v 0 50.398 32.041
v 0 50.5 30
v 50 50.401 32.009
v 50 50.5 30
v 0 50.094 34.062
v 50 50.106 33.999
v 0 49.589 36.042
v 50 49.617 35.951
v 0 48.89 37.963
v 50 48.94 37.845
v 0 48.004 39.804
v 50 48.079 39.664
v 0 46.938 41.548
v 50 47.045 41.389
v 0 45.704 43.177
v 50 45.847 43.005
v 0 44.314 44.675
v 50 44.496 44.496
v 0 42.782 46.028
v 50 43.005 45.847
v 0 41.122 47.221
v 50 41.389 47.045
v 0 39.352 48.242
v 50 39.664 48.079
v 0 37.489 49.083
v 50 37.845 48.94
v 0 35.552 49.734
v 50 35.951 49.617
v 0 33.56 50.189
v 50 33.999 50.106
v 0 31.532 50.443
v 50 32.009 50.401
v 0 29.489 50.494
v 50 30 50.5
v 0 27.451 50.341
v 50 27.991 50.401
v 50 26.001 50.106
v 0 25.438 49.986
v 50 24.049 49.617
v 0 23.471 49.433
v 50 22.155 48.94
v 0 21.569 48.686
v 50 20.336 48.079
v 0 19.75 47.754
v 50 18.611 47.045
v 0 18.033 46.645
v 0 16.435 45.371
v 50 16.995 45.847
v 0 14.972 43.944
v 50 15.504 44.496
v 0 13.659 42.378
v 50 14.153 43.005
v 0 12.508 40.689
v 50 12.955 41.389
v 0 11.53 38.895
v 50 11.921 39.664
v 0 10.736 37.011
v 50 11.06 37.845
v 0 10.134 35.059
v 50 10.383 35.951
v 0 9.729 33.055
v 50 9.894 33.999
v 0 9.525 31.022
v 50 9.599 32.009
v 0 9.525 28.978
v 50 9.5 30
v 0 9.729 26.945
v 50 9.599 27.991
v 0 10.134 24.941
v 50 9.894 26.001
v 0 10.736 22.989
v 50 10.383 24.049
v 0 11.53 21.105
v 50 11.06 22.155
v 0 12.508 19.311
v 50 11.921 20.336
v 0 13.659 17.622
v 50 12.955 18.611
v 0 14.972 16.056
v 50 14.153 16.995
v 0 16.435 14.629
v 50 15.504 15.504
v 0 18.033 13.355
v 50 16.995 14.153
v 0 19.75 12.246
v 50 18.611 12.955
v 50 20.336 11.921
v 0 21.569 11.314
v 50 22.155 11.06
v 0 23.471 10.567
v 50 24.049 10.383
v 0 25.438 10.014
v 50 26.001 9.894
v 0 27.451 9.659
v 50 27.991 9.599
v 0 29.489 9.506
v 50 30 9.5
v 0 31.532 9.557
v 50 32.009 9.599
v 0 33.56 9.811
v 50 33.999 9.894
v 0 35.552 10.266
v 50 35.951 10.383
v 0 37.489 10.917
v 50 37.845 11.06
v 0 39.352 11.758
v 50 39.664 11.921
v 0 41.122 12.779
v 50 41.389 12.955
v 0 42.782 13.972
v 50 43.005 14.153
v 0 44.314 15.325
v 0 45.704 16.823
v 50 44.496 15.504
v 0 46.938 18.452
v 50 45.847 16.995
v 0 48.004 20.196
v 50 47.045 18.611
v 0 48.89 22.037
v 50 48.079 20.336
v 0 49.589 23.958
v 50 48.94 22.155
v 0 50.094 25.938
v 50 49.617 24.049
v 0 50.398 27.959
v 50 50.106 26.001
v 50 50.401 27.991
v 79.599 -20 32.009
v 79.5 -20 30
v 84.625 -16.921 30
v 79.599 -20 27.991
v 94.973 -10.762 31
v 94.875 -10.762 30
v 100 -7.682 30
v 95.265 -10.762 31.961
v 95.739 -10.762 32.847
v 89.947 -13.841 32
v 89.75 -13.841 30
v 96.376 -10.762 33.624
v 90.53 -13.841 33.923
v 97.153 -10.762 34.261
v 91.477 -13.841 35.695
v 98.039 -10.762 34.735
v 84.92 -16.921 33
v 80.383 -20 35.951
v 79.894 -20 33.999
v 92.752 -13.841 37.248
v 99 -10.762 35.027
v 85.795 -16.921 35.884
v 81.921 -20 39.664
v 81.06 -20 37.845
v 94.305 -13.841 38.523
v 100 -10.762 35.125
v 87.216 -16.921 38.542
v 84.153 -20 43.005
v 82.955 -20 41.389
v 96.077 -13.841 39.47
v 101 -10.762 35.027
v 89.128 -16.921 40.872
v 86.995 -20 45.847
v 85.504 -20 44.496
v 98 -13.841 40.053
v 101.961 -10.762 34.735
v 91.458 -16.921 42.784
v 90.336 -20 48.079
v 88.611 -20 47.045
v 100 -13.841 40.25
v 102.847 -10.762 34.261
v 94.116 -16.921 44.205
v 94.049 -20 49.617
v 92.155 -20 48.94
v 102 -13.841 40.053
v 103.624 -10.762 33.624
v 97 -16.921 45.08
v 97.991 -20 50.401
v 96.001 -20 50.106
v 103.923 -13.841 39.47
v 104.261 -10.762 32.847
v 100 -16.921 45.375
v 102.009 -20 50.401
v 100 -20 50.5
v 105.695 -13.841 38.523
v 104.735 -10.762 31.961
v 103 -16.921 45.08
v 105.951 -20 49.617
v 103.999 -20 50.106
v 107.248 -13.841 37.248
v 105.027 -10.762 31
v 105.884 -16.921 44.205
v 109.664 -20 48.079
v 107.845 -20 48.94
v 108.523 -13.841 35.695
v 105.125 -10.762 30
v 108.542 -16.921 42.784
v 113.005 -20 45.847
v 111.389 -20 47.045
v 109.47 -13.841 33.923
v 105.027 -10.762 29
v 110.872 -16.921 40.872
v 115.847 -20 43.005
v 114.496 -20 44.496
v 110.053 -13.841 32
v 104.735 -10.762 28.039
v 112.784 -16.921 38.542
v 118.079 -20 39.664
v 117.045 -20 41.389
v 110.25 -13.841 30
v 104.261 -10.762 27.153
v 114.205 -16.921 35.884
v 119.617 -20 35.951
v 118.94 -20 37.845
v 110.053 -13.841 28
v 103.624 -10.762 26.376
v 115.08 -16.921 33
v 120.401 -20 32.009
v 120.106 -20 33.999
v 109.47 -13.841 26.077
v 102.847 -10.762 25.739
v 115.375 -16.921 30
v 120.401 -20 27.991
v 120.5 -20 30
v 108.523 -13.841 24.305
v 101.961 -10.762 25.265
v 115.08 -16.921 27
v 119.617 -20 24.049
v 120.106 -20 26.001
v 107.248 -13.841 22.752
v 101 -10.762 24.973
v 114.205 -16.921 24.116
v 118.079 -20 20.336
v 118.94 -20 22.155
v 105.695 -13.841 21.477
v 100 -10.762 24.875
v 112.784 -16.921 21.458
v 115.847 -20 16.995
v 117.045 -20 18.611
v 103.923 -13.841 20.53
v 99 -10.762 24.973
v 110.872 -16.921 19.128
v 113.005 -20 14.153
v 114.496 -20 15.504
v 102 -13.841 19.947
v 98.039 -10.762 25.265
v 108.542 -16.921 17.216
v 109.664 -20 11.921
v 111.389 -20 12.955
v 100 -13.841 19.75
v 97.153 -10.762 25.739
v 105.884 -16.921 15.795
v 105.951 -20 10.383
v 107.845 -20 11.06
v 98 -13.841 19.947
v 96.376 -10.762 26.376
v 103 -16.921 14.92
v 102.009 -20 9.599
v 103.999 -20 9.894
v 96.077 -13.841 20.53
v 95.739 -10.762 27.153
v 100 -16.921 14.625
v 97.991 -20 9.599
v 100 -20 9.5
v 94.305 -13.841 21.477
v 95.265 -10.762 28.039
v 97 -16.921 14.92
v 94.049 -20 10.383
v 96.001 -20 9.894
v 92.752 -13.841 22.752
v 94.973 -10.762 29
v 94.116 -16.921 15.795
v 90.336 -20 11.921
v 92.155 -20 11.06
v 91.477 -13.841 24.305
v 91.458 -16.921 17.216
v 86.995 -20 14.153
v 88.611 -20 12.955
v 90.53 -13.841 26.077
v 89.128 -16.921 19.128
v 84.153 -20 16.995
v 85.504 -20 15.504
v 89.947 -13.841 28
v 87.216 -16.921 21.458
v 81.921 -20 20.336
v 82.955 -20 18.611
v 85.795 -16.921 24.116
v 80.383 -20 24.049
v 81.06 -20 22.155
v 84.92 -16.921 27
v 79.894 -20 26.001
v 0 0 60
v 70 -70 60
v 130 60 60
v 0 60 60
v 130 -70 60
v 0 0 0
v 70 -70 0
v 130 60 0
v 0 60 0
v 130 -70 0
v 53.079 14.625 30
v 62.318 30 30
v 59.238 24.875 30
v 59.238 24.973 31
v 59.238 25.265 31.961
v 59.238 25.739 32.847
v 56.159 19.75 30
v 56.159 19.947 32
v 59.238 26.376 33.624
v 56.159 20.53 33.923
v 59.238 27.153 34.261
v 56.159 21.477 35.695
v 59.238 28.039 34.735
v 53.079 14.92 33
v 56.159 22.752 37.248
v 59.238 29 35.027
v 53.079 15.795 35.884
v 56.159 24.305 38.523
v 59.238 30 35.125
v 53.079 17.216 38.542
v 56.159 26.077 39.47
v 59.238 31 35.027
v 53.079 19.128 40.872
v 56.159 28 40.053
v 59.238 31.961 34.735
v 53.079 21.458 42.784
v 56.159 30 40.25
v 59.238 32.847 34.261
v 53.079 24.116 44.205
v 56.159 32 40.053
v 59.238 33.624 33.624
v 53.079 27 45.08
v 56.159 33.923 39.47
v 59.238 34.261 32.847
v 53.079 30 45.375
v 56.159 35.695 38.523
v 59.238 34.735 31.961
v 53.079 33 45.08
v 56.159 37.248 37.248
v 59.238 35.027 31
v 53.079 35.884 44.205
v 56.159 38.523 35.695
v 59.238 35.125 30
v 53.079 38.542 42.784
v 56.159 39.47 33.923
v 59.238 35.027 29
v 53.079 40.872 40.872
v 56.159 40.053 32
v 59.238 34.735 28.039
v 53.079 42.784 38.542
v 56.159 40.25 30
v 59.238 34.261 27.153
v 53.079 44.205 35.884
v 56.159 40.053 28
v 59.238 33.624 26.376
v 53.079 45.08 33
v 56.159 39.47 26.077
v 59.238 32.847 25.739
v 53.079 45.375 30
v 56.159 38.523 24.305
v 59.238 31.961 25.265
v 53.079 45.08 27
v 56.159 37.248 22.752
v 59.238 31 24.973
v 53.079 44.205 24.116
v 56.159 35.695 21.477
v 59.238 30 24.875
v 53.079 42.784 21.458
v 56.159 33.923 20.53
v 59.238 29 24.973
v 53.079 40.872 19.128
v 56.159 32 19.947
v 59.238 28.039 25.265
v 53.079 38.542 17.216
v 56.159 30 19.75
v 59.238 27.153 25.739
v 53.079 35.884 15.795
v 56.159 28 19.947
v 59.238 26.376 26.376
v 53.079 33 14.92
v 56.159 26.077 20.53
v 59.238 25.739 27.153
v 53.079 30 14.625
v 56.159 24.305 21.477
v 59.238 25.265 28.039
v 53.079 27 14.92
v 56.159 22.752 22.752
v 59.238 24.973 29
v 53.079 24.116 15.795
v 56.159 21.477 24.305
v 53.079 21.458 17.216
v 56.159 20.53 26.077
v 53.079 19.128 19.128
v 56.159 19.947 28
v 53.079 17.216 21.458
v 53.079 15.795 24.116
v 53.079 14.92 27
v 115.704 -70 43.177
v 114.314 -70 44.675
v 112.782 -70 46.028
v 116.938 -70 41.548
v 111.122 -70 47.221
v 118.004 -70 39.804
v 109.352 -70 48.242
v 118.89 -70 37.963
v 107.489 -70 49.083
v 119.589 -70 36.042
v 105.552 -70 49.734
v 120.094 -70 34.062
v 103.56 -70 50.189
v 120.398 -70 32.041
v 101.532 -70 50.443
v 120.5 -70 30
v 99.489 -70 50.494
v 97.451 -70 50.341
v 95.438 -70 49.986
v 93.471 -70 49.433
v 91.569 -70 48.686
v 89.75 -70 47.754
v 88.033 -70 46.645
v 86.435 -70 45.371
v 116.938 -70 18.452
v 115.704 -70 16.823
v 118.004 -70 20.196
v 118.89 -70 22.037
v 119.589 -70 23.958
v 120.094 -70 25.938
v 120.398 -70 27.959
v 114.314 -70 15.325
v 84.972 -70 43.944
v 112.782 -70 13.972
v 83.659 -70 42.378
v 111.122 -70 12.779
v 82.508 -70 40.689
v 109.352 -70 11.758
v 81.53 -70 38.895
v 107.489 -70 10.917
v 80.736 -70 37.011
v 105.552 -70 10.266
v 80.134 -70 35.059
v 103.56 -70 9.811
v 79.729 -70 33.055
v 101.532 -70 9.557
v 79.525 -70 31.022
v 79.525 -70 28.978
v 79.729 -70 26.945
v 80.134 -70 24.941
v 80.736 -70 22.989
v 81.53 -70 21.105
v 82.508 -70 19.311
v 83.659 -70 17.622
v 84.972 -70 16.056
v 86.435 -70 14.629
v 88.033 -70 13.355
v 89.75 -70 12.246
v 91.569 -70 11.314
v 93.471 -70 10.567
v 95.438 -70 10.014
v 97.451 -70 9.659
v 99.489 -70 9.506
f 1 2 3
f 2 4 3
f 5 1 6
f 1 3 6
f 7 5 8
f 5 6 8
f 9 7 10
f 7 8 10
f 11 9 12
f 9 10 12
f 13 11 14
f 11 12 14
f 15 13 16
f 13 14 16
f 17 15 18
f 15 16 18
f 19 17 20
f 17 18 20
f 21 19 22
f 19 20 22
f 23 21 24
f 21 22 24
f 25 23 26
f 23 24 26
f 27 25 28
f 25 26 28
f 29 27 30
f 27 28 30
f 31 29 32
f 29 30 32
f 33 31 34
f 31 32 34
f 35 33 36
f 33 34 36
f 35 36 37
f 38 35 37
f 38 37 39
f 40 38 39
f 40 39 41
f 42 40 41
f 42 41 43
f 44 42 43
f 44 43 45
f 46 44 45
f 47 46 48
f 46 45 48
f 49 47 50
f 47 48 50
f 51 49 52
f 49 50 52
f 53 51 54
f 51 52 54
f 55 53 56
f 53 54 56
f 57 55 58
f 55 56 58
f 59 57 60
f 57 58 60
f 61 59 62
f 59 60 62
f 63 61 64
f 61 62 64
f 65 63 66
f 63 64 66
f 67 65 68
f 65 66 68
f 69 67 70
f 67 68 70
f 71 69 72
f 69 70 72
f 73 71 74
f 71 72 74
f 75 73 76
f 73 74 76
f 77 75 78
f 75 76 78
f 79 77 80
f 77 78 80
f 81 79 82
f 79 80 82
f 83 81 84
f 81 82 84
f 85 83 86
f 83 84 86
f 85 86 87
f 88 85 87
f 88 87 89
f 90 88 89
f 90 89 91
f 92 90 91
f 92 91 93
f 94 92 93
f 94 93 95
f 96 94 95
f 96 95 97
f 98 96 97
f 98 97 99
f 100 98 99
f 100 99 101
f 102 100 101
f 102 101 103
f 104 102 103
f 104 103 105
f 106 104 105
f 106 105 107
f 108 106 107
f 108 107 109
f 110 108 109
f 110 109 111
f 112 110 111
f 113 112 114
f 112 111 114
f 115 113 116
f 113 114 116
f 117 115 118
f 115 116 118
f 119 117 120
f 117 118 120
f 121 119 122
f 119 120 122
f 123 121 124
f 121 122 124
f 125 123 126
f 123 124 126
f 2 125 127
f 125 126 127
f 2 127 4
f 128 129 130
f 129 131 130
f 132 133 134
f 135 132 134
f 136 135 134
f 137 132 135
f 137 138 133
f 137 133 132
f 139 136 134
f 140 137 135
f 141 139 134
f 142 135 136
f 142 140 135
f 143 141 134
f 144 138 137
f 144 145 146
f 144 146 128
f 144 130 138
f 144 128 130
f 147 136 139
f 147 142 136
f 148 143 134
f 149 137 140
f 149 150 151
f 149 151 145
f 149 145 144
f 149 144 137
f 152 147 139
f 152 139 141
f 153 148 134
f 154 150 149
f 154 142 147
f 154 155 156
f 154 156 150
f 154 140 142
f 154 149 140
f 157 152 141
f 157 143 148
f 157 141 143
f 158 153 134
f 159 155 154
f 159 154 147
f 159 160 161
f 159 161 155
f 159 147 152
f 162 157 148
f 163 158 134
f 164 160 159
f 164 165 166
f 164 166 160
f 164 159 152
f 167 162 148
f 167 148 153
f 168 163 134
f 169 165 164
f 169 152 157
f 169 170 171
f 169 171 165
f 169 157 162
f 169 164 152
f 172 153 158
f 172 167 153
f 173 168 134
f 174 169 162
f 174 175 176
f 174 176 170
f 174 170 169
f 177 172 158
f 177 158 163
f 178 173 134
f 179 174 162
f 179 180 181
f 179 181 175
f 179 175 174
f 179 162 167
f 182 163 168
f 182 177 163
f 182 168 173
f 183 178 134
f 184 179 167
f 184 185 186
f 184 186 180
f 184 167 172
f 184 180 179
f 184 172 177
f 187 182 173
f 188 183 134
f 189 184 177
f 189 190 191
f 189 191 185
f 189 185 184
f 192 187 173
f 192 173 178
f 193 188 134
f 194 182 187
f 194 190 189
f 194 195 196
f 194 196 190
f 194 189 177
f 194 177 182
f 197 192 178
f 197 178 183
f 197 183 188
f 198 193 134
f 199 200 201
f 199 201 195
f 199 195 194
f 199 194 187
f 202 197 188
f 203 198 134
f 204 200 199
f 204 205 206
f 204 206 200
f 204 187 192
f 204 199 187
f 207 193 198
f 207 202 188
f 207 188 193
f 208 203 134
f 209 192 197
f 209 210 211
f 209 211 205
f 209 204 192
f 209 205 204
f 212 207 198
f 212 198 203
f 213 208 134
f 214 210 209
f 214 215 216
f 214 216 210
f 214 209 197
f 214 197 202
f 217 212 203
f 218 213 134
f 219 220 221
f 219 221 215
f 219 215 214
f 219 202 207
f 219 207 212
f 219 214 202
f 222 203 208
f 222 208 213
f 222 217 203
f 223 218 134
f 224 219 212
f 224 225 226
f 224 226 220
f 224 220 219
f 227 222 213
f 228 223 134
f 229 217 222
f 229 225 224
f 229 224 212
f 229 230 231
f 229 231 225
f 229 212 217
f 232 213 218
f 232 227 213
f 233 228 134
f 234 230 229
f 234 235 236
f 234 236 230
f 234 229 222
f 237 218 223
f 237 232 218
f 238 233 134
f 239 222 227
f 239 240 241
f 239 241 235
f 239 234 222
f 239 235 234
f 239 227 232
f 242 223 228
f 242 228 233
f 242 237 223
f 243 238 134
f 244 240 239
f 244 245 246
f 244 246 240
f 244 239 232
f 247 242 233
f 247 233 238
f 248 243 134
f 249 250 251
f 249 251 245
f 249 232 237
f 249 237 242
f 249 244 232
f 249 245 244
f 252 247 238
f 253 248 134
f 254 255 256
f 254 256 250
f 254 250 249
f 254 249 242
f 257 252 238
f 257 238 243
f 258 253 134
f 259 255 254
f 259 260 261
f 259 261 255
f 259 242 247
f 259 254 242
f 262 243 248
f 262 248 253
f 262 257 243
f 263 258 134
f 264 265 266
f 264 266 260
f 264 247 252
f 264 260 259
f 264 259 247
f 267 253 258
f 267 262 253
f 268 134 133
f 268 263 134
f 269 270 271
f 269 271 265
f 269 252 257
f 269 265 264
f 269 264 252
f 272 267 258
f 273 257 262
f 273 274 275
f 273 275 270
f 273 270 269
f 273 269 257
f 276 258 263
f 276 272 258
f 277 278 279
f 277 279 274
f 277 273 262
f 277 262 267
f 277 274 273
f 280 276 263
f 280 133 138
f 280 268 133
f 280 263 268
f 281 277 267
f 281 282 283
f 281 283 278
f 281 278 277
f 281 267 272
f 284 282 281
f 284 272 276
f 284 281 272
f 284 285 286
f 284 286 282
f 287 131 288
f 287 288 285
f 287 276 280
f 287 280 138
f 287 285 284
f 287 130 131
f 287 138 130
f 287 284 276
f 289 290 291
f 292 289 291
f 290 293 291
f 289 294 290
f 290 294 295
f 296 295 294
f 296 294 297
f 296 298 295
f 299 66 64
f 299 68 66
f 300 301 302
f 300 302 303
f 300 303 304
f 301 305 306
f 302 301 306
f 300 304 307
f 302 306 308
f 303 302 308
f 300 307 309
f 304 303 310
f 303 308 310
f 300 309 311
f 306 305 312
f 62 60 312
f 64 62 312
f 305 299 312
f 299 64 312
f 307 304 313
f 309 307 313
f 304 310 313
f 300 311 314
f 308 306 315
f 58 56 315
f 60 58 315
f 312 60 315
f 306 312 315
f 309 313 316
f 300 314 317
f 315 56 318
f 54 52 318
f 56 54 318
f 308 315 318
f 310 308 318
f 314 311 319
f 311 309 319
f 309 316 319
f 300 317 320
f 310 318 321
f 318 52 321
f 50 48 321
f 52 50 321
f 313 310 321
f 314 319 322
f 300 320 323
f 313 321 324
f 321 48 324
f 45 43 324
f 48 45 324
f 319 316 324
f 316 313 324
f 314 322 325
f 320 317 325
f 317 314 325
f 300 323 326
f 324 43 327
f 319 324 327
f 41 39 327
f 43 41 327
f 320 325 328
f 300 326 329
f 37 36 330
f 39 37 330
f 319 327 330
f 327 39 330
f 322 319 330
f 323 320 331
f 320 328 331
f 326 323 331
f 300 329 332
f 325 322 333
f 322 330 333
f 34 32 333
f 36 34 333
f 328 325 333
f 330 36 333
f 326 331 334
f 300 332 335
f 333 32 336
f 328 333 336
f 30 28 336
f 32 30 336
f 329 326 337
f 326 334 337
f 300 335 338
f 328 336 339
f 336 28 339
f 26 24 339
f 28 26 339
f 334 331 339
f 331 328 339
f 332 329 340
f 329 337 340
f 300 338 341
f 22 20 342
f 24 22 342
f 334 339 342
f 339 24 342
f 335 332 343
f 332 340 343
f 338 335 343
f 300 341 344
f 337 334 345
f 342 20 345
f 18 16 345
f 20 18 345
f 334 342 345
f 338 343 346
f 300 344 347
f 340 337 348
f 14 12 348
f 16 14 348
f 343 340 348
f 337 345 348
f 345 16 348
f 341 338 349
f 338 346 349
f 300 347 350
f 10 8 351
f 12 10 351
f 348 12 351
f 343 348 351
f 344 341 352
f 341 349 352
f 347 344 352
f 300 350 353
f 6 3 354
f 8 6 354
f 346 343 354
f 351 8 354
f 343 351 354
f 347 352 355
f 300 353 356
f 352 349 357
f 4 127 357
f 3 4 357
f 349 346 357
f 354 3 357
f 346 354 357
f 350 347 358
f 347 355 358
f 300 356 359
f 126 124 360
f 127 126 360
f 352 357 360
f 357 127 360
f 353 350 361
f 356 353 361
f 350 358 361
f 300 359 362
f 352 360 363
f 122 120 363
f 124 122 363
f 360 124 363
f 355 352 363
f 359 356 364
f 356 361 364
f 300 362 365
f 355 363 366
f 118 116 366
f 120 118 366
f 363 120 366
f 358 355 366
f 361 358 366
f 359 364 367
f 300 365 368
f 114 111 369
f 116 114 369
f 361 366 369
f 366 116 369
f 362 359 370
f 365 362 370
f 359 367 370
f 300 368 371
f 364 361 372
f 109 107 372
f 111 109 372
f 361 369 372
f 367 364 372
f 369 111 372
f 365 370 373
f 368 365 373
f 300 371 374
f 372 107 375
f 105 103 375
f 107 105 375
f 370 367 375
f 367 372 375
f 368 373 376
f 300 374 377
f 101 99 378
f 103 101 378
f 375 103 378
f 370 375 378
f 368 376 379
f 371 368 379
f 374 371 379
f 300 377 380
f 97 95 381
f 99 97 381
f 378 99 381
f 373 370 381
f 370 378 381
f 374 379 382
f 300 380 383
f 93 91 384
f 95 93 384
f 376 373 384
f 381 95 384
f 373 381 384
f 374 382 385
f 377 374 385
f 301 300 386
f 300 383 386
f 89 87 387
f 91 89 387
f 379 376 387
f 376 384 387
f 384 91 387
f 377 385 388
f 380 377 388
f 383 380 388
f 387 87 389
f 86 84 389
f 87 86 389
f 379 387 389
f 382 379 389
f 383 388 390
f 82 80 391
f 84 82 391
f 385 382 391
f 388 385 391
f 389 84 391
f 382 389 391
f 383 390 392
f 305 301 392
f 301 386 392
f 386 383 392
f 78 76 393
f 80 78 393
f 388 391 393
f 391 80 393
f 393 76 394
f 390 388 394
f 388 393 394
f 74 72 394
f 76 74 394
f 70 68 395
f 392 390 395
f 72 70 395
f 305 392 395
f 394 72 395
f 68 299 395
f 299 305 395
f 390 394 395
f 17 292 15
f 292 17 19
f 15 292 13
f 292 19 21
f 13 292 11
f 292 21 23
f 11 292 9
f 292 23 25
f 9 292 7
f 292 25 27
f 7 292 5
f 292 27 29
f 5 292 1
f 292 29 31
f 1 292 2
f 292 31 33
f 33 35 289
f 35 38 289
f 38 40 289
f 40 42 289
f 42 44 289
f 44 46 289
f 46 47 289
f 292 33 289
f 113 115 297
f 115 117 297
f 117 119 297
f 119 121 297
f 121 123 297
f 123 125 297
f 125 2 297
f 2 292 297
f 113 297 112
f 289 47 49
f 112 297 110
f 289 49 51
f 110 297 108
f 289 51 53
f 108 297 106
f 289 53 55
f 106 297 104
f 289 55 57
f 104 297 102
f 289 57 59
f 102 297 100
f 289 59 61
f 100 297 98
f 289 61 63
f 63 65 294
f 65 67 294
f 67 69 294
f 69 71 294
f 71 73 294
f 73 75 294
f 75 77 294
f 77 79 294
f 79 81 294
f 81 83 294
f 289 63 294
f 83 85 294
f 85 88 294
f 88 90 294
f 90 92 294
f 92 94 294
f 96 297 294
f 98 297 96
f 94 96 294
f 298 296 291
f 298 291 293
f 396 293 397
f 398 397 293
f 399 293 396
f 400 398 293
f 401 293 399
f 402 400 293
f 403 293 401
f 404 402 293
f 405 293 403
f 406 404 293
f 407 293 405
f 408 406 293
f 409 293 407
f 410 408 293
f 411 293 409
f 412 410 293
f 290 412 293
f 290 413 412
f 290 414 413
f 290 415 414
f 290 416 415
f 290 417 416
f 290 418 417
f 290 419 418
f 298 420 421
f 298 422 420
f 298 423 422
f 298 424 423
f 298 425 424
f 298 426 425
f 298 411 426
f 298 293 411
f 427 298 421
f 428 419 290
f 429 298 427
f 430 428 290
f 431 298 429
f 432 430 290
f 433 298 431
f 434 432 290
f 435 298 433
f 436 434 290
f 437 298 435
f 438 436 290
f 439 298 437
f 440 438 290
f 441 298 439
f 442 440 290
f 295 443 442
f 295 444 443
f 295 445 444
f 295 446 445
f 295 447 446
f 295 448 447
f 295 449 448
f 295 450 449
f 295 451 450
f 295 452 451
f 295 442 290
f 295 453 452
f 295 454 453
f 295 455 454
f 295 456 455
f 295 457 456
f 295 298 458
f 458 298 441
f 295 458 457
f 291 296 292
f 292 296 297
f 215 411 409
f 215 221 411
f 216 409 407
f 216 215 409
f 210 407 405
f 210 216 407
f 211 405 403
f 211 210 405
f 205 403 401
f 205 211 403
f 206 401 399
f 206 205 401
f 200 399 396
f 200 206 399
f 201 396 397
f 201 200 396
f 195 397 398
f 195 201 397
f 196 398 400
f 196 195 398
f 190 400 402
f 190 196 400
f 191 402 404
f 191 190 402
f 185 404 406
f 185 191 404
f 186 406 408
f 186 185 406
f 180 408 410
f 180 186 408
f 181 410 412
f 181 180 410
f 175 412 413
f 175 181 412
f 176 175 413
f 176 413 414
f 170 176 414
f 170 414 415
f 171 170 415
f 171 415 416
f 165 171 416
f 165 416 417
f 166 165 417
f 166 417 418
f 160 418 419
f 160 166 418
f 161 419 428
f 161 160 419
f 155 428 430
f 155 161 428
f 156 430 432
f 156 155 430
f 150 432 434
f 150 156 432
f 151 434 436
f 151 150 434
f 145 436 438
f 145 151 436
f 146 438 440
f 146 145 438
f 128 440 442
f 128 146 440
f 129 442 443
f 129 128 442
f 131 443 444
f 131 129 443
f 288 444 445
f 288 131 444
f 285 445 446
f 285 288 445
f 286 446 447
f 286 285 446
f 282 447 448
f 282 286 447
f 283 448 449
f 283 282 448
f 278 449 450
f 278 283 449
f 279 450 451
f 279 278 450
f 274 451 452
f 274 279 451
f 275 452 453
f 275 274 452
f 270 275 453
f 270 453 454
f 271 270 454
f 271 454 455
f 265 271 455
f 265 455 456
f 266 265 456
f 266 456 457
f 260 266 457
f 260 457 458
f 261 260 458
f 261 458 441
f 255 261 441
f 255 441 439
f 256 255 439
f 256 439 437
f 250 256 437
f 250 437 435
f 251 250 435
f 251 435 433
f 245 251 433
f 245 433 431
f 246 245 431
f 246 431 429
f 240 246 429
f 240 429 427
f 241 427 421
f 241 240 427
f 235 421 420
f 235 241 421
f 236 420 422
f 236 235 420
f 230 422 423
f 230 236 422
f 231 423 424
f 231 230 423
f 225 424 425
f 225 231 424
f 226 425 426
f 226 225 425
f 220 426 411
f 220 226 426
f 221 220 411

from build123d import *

# Parameters (mm, degrees)
F1_DEPTH = 60
F3_D     = 41
F3_DEPTH = 50
F3_TIP   = 12.3176426901
F6_DEPTH = 60


with BuildPart() as f1:
    # F0 (on Top) → F1 (new body)
    with BuildSketch(Plane.XY):
        Polygon((130, 60), (0, 60), (0, 30), (0, 0), (70, 0), align=None)
    extrude(amount=F1_DEPTH)

    # F3
    with Locations(Plane(origin=(0, 0, 0), x_dir=(0, -1, 0), z_dir=(-1, 0, 0))):
        with Locations((-30, 30)):
            Hole(F3_D / 2, depth=F3_DEPTH)
            with Locations((0, 0, -(F3_DEPTH + F3_TIP / 2))):  # 118° drill point
                Cone(0, F3_D / 2, F3_TIP, mode=Mode.SUBTRACT)

    # F4: F1 across face


with BuildPart() as f1_1:
    add(f1.part)
    add(f1.part.mirror(Plane(origin=(100, 30, 30), x_dir=(0.7071067812, 0.7071067812, 0), z_dir=(0.7071067812, -0.7071067812, 0))))

    # F5 (on Top) → F6 (join)
    with BuildSketch(Plane.XY):
        Polygon((70.0001195073, 0), (0, 0), (70.0001195073, -69.9999108911), align=None)
    extrude(amount=F6_DEPTH)


solid = f1_1.part
